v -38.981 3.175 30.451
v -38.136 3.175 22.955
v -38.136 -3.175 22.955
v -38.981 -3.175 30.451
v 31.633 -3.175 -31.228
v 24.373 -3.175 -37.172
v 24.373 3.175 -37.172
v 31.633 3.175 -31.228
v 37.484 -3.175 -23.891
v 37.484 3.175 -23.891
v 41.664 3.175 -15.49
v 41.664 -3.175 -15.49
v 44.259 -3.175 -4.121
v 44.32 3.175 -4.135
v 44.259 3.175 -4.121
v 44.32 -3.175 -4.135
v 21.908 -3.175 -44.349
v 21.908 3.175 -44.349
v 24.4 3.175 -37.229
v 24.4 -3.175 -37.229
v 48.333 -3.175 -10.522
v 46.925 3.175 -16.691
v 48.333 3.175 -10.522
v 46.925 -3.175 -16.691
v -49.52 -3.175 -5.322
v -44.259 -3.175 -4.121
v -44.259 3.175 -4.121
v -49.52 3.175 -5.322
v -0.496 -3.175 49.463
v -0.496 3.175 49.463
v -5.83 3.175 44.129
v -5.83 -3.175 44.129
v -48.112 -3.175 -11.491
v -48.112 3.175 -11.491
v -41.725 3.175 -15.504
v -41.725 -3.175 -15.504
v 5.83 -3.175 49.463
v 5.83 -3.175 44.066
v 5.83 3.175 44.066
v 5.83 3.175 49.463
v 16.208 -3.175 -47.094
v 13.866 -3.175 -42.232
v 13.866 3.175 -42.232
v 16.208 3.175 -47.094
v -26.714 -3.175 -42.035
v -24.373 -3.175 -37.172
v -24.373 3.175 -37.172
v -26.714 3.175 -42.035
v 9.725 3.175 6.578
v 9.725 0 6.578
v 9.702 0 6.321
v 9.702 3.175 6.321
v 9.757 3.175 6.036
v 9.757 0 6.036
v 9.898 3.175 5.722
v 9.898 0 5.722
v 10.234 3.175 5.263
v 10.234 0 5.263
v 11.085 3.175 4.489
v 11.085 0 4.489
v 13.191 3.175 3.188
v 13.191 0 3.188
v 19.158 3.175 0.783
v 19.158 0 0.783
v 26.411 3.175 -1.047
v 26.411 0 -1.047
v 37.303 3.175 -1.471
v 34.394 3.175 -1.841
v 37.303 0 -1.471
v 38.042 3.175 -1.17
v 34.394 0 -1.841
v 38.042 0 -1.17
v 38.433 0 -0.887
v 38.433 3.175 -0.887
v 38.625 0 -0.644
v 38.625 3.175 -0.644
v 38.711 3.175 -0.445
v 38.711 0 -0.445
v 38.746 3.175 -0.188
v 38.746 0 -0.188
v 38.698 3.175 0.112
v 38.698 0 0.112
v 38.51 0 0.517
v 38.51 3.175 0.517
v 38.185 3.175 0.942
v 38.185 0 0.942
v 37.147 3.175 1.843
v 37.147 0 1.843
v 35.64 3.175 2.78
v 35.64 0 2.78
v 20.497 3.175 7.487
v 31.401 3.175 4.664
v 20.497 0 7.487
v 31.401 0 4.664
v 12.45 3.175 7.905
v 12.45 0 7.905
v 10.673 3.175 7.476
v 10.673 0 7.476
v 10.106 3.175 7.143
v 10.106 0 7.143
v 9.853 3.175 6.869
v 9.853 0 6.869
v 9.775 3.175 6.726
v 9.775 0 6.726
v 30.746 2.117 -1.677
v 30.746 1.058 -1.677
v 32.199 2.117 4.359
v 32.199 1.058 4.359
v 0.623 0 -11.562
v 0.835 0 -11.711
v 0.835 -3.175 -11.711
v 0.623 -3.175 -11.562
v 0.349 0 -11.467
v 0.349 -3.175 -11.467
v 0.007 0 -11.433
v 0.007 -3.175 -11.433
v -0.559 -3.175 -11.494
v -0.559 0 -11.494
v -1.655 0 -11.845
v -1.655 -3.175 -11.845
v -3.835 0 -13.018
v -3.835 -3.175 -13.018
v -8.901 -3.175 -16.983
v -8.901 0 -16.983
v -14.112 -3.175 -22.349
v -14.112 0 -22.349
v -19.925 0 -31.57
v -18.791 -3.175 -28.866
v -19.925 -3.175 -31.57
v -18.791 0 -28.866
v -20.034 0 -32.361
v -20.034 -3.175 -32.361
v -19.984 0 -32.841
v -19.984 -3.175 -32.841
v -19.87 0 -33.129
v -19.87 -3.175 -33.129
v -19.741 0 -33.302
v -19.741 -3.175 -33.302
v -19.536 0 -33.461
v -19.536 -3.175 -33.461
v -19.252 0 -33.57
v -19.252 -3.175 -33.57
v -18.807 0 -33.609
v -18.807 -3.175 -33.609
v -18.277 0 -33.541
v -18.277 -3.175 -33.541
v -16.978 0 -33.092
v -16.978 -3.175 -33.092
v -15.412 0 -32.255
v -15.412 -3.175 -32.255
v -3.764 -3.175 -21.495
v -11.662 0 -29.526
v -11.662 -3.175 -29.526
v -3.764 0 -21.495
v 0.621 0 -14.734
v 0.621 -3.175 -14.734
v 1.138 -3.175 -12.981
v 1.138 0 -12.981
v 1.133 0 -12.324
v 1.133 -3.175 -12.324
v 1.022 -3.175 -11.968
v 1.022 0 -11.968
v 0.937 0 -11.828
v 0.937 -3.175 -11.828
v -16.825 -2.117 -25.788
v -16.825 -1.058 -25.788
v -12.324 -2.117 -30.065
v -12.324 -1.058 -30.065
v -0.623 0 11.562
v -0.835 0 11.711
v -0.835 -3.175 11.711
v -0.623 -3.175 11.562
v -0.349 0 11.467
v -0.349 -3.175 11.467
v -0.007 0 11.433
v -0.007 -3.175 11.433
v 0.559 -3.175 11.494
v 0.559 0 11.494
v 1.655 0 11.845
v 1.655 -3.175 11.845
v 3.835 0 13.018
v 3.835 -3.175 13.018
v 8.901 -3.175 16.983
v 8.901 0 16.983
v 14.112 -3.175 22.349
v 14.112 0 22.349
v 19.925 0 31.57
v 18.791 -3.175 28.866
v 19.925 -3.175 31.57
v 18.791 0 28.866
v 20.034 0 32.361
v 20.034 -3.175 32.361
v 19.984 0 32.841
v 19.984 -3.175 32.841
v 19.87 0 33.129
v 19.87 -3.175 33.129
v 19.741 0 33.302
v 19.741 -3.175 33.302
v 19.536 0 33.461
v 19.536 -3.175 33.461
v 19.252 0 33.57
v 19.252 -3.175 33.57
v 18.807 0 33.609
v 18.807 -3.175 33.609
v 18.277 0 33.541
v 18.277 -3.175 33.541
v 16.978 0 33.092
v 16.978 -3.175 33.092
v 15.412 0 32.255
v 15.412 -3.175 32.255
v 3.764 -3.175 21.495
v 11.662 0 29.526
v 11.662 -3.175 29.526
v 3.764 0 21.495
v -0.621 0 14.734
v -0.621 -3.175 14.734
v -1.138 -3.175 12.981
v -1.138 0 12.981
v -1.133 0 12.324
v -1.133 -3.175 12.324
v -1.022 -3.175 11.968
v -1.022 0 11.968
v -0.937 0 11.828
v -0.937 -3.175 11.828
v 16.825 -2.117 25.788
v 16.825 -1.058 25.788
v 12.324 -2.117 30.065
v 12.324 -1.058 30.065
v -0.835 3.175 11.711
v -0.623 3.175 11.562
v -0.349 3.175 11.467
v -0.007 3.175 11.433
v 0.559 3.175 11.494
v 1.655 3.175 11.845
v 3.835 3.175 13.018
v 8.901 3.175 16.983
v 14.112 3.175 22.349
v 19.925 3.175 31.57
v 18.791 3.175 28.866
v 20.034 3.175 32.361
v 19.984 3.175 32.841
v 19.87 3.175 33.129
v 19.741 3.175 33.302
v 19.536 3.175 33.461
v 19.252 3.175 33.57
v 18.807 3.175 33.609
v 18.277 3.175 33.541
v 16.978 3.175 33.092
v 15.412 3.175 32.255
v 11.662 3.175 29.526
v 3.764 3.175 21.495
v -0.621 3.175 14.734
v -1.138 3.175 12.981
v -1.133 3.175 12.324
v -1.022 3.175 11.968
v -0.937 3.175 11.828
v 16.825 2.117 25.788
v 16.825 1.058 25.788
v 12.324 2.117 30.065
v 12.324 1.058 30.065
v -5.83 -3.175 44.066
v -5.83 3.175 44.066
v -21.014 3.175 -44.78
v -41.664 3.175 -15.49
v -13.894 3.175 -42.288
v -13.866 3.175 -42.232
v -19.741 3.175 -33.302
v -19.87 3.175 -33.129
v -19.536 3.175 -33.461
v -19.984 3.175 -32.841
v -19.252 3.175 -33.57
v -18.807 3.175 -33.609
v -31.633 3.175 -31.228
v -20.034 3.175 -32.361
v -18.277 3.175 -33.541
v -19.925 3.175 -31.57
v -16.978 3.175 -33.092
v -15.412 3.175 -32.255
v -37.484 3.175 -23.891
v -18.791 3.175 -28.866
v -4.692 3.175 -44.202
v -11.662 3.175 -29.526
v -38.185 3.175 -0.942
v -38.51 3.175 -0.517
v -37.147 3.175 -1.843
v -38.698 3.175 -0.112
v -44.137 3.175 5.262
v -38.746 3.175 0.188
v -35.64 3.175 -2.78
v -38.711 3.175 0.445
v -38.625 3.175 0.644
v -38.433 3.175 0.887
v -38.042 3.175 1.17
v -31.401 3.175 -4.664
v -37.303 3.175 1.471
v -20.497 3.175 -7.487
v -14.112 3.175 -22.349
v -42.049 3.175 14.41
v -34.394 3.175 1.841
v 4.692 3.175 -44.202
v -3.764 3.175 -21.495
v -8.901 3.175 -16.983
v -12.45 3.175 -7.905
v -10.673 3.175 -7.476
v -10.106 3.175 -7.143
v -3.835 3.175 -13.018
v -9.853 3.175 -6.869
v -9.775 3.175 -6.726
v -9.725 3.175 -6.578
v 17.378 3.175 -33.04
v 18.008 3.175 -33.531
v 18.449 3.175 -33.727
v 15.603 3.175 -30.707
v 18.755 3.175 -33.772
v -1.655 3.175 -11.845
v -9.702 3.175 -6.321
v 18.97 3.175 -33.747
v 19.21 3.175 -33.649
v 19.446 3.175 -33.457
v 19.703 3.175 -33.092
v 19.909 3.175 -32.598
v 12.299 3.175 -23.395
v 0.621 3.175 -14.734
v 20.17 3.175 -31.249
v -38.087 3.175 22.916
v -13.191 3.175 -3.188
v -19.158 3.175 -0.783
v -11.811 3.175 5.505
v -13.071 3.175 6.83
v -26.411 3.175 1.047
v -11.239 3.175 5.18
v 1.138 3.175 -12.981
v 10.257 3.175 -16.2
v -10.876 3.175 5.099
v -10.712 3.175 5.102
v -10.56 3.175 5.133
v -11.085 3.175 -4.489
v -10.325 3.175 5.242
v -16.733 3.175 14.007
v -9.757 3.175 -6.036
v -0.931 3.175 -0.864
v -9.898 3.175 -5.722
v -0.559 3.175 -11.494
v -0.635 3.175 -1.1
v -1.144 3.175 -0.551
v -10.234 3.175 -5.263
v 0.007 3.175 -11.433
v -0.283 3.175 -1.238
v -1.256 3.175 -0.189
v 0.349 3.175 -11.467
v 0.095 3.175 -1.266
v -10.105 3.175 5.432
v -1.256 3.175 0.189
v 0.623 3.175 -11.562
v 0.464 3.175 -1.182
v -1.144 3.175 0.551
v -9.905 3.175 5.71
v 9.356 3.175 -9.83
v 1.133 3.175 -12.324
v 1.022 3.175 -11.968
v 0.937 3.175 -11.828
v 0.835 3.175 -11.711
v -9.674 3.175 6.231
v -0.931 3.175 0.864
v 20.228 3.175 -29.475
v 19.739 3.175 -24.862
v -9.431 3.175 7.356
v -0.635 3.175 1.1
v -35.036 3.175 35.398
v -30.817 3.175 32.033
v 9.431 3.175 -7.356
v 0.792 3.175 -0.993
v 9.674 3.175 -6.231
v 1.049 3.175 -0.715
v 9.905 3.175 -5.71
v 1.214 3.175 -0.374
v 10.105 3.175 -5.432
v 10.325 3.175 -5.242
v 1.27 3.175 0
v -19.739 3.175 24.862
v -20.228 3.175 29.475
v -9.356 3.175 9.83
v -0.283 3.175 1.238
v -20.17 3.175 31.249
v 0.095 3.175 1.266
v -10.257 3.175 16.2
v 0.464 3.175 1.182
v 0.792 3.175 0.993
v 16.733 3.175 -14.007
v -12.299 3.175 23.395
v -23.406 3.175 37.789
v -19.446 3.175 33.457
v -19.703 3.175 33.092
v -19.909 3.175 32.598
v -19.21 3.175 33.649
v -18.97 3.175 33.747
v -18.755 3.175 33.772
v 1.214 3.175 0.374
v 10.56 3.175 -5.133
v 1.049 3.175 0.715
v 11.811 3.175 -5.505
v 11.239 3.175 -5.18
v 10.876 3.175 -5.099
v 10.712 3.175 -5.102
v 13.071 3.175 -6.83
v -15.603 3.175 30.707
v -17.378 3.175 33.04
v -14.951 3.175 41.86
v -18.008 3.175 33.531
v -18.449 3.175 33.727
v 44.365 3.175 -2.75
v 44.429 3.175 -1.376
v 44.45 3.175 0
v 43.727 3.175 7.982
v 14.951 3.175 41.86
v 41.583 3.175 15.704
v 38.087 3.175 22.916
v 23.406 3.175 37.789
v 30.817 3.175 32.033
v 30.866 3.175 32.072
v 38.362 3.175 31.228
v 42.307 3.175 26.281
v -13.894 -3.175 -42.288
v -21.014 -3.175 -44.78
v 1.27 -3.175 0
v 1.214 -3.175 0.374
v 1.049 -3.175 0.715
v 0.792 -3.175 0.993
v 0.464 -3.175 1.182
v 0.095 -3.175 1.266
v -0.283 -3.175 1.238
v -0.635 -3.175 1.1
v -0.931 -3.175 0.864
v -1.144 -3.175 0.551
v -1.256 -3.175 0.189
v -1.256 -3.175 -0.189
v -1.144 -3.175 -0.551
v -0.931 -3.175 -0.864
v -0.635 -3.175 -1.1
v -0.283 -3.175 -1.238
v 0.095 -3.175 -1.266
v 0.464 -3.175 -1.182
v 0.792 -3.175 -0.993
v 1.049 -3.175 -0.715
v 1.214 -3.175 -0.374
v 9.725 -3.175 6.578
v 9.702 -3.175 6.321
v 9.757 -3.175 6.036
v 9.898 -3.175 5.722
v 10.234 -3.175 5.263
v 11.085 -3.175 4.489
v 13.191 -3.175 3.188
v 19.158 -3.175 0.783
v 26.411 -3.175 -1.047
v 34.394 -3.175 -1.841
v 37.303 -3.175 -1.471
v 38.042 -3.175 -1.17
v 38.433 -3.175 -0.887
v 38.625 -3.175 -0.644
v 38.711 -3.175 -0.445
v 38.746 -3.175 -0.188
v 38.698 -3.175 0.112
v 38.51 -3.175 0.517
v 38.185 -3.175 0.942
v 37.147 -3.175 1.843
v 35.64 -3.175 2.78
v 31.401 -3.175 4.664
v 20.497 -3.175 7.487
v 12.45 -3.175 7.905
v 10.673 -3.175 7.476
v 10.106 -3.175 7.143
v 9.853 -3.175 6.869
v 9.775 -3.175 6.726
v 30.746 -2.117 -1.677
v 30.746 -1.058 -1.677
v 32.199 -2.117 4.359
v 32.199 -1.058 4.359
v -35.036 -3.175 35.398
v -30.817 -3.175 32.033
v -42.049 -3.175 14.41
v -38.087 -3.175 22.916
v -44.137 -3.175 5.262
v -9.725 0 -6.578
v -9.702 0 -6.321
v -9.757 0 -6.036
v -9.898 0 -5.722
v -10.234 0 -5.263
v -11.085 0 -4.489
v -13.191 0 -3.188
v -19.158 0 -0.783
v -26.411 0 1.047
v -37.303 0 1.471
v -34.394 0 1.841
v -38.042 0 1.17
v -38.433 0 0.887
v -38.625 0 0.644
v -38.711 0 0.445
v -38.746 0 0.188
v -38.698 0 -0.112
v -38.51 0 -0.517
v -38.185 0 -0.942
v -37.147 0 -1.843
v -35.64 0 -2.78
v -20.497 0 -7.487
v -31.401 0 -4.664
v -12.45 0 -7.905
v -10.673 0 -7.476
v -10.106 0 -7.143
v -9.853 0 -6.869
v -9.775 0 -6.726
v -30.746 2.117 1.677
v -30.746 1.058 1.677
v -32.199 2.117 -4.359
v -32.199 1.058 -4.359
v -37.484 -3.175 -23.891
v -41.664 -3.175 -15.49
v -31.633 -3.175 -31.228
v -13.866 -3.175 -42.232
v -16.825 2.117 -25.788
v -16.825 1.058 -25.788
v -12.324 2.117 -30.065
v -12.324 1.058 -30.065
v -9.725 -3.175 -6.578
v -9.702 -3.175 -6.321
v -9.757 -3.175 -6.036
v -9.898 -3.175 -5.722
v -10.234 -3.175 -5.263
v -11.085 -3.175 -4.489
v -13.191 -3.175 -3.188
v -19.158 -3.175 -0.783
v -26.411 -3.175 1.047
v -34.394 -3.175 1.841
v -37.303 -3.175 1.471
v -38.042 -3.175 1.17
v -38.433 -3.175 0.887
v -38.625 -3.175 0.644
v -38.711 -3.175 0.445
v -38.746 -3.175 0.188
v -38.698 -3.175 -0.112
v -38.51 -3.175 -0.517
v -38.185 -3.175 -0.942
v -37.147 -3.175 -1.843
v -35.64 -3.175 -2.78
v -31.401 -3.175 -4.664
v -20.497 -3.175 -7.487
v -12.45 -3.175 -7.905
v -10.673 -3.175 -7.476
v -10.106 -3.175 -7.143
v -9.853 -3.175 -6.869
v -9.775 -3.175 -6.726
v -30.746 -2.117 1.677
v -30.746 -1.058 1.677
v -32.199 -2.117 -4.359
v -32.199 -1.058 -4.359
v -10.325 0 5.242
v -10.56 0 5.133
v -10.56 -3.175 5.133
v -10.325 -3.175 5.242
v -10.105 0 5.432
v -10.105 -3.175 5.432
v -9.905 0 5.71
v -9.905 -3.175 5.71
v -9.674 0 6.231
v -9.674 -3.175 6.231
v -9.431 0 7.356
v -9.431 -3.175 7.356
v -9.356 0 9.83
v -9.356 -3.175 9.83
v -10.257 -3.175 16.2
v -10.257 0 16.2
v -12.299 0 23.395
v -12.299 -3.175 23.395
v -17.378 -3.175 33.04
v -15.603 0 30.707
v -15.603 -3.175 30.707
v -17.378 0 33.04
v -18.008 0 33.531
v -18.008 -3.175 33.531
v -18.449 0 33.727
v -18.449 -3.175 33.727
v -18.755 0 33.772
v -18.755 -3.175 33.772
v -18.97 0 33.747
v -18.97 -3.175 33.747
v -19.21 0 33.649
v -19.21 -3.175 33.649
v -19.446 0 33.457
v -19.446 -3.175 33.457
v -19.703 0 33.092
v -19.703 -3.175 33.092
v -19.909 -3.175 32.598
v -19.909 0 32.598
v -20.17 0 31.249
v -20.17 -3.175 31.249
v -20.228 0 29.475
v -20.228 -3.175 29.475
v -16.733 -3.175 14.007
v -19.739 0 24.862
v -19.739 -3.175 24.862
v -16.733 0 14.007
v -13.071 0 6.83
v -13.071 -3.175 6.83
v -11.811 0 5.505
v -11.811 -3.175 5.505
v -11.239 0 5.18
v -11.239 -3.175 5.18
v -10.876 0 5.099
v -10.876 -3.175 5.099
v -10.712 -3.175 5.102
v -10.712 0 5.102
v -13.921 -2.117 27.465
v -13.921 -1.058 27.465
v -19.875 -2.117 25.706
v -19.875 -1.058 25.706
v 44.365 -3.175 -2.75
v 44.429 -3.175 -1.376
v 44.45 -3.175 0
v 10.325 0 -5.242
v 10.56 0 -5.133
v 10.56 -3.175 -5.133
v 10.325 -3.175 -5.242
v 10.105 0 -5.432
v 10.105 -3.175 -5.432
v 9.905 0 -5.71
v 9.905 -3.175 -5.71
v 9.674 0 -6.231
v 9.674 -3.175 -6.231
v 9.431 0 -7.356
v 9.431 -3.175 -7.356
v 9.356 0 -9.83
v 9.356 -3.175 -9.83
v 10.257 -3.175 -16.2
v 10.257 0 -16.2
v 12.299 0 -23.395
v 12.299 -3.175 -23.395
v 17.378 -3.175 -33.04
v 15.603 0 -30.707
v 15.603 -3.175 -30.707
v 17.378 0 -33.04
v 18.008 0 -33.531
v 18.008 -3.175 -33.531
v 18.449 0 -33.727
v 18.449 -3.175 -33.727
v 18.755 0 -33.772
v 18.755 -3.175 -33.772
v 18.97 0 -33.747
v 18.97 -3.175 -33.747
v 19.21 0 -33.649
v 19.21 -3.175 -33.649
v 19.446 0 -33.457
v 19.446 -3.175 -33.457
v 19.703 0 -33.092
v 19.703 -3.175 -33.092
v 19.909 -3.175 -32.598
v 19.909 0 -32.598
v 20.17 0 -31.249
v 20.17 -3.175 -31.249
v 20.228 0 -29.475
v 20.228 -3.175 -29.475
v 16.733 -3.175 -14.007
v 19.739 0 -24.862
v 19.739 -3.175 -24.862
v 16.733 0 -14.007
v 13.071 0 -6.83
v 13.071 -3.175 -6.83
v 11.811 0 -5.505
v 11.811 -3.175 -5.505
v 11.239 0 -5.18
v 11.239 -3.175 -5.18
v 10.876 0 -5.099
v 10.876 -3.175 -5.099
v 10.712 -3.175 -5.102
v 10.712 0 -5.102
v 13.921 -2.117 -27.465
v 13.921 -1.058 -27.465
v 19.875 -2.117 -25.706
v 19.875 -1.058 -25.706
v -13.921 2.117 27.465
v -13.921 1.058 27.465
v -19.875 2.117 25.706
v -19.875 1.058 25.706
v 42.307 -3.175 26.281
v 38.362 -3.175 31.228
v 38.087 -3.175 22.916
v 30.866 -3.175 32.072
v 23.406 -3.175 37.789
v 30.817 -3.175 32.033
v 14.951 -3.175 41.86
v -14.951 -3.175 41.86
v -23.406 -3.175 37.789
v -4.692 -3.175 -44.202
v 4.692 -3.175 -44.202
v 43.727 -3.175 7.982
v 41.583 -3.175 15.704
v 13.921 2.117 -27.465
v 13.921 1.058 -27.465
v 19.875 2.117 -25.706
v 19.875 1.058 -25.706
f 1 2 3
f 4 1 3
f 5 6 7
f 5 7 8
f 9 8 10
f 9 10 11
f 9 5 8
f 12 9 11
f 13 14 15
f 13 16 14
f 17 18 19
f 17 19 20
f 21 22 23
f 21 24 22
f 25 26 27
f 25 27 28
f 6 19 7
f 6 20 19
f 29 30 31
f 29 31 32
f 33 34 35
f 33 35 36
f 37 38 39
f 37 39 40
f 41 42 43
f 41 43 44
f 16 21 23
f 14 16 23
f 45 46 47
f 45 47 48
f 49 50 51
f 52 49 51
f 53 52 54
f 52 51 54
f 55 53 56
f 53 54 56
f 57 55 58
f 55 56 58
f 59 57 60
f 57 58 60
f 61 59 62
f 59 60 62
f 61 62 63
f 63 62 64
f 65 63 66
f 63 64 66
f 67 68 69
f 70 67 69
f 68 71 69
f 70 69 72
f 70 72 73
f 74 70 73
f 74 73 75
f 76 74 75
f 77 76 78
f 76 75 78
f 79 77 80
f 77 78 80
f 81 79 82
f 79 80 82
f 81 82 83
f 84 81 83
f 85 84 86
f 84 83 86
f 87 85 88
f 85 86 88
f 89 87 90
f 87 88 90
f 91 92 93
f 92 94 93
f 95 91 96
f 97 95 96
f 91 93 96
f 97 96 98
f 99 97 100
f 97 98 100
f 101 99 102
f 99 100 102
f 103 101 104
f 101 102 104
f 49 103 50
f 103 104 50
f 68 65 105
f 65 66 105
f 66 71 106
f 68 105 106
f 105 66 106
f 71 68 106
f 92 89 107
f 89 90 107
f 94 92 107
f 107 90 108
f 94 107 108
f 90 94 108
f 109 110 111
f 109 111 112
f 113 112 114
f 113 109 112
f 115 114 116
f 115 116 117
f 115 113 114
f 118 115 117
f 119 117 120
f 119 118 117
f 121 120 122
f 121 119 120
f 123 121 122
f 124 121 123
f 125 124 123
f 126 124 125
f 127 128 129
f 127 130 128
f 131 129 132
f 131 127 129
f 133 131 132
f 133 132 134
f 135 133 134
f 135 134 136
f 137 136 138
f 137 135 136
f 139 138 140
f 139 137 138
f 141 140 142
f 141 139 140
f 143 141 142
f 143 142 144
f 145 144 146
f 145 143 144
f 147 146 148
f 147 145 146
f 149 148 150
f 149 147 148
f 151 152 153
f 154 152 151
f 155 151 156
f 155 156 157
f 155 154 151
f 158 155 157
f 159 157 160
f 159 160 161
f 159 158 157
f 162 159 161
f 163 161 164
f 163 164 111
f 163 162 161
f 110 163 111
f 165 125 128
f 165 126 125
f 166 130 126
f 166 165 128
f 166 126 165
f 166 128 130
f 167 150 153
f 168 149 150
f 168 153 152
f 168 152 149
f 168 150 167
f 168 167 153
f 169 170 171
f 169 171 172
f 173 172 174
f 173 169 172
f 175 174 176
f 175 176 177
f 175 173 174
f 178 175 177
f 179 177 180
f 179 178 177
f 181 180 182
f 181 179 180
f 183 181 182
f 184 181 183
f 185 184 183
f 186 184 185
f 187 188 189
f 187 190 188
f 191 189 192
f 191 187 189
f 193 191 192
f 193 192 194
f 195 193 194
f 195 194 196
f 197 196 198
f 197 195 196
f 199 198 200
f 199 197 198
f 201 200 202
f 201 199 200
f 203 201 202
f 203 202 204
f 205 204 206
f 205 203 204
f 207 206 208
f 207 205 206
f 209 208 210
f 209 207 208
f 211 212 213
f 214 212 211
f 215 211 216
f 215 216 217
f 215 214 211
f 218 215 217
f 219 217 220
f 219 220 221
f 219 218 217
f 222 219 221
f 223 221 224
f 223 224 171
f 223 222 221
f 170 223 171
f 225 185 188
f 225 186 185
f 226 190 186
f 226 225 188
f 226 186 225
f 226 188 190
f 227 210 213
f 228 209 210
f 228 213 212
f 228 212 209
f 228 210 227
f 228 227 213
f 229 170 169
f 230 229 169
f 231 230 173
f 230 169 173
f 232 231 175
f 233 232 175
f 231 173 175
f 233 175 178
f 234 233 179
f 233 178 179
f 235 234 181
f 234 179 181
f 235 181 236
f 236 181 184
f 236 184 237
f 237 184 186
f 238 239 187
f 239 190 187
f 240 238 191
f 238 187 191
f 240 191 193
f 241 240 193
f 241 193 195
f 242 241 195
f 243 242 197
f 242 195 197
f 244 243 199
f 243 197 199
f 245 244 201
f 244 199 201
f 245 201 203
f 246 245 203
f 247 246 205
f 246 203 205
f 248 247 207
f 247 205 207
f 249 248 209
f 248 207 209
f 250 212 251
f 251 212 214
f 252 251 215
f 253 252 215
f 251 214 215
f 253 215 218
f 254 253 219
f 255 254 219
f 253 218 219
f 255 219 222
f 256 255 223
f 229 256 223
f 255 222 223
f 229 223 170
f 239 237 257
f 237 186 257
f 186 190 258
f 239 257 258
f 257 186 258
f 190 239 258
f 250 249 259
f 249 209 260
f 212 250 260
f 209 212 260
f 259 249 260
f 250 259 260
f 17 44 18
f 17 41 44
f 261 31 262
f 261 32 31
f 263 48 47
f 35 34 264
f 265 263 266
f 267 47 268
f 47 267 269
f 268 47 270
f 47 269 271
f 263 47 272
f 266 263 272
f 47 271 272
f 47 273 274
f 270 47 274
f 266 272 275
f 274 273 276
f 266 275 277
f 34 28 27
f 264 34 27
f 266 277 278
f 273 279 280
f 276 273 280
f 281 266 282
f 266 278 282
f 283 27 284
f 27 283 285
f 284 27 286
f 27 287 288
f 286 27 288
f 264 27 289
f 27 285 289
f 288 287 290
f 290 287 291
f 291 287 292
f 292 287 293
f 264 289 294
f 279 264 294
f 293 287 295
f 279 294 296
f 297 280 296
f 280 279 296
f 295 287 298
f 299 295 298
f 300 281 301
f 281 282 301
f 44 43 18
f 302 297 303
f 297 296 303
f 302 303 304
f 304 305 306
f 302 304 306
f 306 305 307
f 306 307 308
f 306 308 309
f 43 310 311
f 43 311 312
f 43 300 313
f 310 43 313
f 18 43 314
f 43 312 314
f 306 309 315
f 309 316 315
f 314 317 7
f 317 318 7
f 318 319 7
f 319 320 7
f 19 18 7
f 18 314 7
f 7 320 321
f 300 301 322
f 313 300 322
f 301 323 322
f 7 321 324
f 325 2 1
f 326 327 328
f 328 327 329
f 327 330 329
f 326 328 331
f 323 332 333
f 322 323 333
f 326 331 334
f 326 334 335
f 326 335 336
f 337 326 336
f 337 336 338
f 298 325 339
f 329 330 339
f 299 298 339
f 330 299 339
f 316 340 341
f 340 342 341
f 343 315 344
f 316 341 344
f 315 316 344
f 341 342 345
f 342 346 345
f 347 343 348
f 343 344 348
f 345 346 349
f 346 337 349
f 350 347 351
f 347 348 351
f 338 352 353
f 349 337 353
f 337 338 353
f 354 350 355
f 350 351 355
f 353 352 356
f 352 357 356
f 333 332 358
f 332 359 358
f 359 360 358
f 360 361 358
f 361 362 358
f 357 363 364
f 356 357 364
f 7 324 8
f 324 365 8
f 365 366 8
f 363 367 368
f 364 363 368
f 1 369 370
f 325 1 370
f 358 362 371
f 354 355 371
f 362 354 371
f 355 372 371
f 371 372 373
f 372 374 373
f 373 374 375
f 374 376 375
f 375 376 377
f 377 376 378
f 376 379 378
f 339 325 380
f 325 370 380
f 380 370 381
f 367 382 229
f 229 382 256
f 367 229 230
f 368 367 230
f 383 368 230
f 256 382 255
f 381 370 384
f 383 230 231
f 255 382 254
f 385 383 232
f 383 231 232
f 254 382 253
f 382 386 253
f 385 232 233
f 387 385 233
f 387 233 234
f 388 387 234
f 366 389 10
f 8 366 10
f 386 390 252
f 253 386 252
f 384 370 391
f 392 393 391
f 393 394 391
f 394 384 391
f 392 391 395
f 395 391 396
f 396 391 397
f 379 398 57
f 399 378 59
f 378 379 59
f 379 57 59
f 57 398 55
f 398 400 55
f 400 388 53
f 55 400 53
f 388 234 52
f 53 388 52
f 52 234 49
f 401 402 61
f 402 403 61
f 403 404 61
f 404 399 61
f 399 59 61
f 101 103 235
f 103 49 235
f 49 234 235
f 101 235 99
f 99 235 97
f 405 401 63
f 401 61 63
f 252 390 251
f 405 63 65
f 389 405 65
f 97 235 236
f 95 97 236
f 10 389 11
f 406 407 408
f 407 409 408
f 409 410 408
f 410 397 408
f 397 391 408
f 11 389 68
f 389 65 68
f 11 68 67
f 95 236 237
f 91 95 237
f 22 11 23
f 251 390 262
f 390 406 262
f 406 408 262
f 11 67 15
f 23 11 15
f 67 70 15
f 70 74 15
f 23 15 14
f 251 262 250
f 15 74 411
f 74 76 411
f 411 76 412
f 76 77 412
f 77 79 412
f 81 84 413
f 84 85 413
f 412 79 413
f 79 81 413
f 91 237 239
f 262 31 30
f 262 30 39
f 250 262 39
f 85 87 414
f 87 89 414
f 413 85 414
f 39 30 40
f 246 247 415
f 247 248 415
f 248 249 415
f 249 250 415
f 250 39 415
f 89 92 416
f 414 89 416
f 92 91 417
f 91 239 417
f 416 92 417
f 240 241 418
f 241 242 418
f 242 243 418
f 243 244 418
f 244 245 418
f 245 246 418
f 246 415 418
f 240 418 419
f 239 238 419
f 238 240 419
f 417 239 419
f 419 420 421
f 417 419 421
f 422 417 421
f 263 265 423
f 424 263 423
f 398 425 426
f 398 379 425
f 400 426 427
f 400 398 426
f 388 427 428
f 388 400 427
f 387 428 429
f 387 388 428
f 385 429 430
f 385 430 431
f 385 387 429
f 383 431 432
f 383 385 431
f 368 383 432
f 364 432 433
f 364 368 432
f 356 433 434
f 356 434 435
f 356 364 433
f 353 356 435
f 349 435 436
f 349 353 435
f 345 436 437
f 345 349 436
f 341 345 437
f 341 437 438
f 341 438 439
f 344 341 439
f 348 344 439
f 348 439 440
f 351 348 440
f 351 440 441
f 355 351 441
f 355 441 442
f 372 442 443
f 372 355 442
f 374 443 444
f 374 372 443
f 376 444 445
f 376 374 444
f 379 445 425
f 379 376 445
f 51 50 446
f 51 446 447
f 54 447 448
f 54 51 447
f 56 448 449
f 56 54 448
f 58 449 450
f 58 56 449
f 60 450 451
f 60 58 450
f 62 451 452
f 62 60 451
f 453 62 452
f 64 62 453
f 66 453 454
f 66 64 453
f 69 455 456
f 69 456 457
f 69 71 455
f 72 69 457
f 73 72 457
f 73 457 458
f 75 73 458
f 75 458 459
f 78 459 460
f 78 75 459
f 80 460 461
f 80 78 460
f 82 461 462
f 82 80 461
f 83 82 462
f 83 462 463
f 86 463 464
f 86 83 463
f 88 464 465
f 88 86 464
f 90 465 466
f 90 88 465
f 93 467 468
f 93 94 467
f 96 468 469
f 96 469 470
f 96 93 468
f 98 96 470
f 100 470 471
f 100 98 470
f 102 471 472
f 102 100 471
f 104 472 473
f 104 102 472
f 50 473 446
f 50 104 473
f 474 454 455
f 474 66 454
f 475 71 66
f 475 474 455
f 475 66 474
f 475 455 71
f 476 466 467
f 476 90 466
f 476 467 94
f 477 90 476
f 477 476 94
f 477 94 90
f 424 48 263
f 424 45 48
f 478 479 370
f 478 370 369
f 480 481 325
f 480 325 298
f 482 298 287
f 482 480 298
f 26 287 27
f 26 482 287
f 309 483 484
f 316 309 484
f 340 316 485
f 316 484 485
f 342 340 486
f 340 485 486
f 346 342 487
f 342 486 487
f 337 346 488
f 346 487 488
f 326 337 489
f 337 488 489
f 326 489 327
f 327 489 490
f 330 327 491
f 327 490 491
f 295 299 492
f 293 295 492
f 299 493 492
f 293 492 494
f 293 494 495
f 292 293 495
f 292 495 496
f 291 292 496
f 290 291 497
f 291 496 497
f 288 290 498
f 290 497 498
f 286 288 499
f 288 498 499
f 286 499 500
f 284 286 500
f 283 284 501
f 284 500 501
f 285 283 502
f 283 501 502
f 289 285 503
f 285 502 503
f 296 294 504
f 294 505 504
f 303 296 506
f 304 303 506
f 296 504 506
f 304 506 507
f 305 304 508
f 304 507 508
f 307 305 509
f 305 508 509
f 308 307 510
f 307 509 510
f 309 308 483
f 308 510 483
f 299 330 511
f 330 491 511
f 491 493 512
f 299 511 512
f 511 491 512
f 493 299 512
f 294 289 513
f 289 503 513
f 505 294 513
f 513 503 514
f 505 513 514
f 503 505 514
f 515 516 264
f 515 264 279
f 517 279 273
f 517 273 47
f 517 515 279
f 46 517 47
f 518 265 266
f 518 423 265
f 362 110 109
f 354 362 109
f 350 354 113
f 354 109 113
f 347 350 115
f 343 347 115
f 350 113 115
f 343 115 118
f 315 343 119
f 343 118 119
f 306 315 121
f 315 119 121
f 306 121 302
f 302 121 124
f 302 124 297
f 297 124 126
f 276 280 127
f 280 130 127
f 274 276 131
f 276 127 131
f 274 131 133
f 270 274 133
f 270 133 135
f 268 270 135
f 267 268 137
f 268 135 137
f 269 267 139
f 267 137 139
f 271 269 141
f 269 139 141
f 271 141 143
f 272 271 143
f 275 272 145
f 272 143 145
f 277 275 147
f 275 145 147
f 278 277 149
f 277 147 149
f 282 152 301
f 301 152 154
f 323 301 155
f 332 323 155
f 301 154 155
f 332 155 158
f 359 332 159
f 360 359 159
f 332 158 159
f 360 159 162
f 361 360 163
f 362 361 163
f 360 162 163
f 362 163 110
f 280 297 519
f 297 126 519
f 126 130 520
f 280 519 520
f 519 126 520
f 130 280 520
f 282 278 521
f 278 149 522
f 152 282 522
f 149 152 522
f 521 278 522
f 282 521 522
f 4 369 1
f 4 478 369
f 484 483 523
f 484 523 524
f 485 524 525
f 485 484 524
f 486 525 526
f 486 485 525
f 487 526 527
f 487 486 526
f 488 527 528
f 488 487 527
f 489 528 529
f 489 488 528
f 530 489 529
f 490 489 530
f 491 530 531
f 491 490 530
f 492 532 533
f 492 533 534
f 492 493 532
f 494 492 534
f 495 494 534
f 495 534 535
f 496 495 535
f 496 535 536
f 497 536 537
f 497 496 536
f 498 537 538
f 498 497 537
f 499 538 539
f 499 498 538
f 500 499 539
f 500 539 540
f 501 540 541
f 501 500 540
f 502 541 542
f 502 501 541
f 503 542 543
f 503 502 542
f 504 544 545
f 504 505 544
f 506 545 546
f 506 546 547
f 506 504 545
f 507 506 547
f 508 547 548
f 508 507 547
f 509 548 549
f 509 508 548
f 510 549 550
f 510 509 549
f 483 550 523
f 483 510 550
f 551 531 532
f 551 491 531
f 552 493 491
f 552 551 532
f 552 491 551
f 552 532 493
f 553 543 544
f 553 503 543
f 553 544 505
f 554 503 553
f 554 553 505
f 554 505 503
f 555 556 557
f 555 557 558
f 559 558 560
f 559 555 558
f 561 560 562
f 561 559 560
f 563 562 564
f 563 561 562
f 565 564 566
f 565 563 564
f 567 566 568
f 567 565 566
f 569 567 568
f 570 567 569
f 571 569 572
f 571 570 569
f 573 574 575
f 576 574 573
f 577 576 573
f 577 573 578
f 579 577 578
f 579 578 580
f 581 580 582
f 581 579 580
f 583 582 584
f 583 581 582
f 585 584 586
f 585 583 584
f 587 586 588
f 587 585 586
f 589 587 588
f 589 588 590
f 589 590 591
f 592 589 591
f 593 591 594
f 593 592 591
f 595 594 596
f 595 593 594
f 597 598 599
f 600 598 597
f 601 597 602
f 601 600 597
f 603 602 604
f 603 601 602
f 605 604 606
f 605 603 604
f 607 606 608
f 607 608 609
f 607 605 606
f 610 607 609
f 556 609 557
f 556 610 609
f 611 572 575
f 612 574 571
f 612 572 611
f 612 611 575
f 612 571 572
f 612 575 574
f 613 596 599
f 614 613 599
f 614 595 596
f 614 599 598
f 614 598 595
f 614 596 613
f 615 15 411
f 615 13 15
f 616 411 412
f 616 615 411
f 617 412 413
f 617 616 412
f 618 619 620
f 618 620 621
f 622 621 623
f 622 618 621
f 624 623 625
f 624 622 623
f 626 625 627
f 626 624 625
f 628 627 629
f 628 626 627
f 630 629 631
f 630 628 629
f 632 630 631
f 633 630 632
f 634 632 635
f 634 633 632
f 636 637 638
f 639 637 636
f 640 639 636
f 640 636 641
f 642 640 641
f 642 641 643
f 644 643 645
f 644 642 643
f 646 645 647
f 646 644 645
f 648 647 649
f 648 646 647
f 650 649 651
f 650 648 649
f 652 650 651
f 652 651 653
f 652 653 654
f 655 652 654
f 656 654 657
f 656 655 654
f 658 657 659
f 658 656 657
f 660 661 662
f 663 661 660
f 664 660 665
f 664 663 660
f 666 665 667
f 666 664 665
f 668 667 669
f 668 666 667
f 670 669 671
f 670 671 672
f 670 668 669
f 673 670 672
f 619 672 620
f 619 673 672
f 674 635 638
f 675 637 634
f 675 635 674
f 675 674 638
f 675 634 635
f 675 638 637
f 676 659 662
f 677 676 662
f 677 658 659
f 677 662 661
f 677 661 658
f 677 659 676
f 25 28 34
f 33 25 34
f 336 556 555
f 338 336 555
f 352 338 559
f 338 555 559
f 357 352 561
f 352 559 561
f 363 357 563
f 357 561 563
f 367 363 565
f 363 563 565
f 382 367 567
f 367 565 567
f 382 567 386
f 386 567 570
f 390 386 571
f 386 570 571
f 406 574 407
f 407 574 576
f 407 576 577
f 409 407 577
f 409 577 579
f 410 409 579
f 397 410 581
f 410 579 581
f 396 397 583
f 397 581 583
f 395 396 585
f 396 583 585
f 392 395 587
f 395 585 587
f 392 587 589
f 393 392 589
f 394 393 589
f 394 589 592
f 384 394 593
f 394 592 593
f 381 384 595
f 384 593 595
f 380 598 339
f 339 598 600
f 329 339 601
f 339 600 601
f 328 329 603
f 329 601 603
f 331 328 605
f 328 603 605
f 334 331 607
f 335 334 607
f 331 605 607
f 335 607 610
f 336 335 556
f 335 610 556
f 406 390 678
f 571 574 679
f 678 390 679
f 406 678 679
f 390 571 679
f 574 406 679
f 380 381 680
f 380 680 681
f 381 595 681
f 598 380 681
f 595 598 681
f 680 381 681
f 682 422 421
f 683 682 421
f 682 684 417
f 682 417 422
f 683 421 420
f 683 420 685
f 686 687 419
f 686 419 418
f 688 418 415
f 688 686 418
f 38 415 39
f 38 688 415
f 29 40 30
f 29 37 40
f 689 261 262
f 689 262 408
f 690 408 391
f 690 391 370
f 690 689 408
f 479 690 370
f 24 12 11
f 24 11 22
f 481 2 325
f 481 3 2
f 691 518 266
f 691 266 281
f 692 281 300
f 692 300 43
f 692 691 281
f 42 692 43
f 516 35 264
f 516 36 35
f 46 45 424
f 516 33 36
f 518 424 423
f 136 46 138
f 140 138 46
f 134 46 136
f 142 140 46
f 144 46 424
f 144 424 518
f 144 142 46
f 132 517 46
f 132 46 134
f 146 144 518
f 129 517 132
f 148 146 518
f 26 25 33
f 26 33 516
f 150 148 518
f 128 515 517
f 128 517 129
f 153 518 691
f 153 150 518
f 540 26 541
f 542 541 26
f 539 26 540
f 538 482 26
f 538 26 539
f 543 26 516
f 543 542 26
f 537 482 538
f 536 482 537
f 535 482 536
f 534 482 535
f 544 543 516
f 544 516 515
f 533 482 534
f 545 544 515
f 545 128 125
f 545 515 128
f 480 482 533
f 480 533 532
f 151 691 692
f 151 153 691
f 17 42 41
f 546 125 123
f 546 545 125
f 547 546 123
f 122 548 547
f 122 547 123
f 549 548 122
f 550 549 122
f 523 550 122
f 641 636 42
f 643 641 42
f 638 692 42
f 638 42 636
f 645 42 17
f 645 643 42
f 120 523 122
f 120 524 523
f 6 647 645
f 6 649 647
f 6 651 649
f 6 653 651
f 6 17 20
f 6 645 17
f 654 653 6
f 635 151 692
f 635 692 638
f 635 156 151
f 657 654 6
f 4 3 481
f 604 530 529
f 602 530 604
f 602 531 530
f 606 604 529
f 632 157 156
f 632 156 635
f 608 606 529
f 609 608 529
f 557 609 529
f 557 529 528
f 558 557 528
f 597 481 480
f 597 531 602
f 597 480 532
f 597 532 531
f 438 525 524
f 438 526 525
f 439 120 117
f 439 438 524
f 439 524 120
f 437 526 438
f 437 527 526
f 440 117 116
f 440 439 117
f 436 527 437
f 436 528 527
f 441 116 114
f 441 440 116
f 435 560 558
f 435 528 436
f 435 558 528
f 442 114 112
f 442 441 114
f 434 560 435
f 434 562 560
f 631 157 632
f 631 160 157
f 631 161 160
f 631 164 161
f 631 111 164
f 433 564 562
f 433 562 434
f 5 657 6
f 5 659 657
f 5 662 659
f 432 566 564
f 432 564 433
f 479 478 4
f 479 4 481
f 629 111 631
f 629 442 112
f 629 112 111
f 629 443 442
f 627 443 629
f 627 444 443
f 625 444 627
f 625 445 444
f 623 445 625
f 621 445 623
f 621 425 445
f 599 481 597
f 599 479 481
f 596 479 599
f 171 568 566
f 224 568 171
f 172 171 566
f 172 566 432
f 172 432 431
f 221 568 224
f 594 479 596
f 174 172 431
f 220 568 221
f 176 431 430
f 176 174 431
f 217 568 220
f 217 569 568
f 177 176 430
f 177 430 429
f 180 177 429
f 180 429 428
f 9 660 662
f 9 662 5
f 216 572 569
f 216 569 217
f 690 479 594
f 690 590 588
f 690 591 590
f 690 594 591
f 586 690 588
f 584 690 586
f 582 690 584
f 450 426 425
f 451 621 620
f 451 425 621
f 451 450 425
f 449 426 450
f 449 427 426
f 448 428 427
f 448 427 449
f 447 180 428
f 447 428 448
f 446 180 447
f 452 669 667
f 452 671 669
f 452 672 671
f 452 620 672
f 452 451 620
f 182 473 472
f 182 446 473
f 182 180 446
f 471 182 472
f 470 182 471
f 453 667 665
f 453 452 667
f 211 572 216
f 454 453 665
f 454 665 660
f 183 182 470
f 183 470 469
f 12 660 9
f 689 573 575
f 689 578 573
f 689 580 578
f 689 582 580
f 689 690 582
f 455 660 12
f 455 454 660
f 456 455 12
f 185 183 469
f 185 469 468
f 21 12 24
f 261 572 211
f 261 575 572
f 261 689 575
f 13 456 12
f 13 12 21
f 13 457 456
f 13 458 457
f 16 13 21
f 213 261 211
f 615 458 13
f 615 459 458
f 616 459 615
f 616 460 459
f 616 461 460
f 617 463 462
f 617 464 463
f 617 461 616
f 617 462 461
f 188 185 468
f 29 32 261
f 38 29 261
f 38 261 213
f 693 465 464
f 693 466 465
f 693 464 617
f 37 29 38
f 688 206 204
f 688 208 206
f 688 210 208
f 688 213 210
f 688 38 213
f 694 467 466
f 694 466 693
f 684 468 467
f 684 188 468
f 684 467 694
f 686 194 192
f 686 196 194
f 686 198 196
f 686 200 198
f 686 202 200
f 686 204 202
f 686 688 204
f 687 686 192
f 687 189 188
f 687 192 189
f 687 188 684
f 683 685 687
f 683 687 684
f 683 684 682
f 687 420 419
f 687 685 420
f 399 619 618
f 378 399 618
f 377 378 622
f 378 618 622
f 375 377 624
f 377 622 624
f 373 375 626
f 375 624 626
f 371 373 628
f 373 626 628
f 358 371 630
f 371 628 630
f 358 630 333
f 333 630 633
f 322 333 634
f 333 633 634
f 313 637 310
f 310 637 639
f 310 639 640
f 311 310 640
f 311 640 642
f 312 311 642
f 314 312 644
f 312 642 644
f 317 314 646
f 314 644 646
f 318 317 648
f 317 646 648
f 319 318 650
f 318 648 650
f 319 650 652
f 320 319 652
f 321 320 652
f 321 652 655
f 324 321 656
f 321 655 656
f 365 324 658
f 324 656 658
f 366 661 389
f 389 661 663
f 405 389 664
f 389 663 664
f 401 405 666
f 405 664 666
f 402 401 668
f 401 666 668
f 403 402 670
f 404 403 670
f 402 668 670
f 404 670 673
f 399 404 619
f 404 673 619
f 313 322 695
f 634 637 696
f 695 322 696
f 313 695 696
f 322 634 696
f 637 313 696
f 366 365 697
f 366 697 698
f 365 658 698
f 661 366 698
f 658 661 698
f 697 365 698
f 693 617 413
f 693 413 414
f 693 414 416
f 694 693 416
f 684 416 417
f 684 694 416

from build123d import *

# Parameters (mm, degrees)
F0_R     = 1.27
F1_DEPTH = 3.175
F2_SIZE  = 5.334


with BuildPart() as f1:
    # F0 (on Front) → F1 (new body, symmetric)
    with BuildSketch(Plane.XZ):
        with BuildLine():
            ThreePointArc((44.258528, -4.121313), (44.402106, -2.062879), (44.45, 0))
            ThreePointArc((44.45, 0), (42.829819, 11.891557), (38.087385, 22.916231))
            ThreePointArc((38.087385, 22.916231), (34.752409, 27.714122), (30.816913, 32.033113))
            ThreePointArc((30.816913, 32.033113), (19.286132, 40.048066), (5.830465, 44.065953))
            ThreePointArc((5.830465, 44.065953), (0, 44.45), (-5.830465, 44.065953))
            ThreePointArc((-5.830465, 44.065953), (-19.286132, 40.048066), (-30.816913, 32.033113))
            ThreePointArc((-30.816913, 32.033113), (-34.752409, 27.714122), (-38.087385, 22.916231))
            ThreePointArc((-38.087385, 22.916231), (-43.335546, 9.891056), (-44.258528, -4.121313))
            ThreePointArc((-44.258528, -4.121313), (-43.335546, -9.891056), (-41.663726, -15.48988))
            ThreePointArc((-41.663726, -15.48988), (-34.752409, -27.714122), (-24.372568, -37.172307))
            ThreePointArc((-24.372568, -37.172307), (-19.286132, -40.048066), (-13.866432, -42.231796))
            ThreePointArc((-13.866432, -42.231796), (0, -44.45), (13.866432, -42.231796))
            ThreePointArc((13.866432, -42.231796), (19.286132, -40.048066), (24.372568, -37.172307))
            ThreePointArc((24.372568, -37.172307), (34.752409, -27.714122), (41.663726, -15.48988))
            ThreePointArc((41.663726, -15.48988), (43.335546, -9.891056), (44.258528, -4.121313))
        make_face()
        with BuildLine():
            add(Edge.make_bspline(
                [(0.834731, -11.71119), (-3.66602, -7.434163), (-16.824949, -25.788016), (-29.983878, -44.141868), (-12.324198, -30.065043), (5.335483, -15.988218), (0.834731, -11.71119)],
                knots=[0, 0, 0, 2.094395, 2.094395, 4.18879, 4.18879, 6.283185, 6.283185, 6.283185], degree=2, weights=[1, 0.5, 1, 0.5, 1, 0.5, 1]))
        make_face(mode=Mode.SUBTRACT)
        with BuildLine():
            add(Edge.make_bspline(
                [(-9.724823, -6.578494), (-8.271184, -0.542215), (-30.745551, 1.676825), (-53.219918, 3.895866), (-32.19919, -4.359453), (-11.178461, -12.614772), (-9.724823, -6.578494)],
                knots=[0, 0, 0, 2.094395, 2.094395, 4.18879, 4.18879, 6.283185, 6.283185, 6.283185], degree=2, weights=[1, 0.5, 1, 0.5, 1, 0.5, 1]))
        make_face(mode=Mode.SUBTRACT)
        with BuildLine():
            add(Edge.make_bspline(
                [(10.559554, -5.132697), (4.605164, -6.891948), (13.920602, -27.464841), (23.23604, -48.037734), (19.874992, -25.70559), (16.513944, -3.373445), (10.559554, -5.132697)],
                knots=[0, 0, 0, 2.094395, 2.094395, 4.18879, 4.18879, 6.283185, 6.283185, 6.283185], degree=2, weights=[1, 0.5, 1, 0.5, 1, 0.5, 1]))
        make_face(mode=Mode.SUBTRACT)
        Circle(F0_R, mode=Mode.SUBTRACT)
        with BuildLine():
            add(Edge.make_bspline(
                [(-10.559554, 5.132697), (-4.605164, 6.891948), (-13.920602, 27.464841), (-23.23604, 48.037734), (-19.874992, 25.70559), (-16.513944, 3.373445), (-10.559554, 5.132697)],
                knots=[0, 0, 0, 2.094395, 2.094395, 4.18879, 4.18879, 6.283185, 6.283185, 6.283185], degree=2, weights=[1, 0.5, 1, 0.5, 1, 0.5, 1]))
        make_face(mode=Mode.SUBTRACT)
        with BuildLine():
            add(Edge.make_bspline(
                [(9.724823, 6.578494), (8.271184, 0.542215), (30.745551, -1.676825), (53.219918, -3.895866), (32.19919, 4.359453), (11.178461, 12.614772), (9.724823, 6.578494)],
                knots=[0, 0, 0, 2.094395, 2.094395, 4.18879, 4.18879, 6.283185, 6.283185, 6.283185], degree=2, weights=[1, 0.5, 1, 0.5, 1, 0.5, 1]))
        make_face(mode=Mode.SUBTRACT)
        with BuildLine():
            add(Edge.make_bspline(
                [(-0.834731, 11.71119), (3.66602, 7.434163), (16.824949, 25.788016), (29.983878, 44.141868), (12.324198, 30.065043), (-5.335483, 15.988218), (-0.834731, 11.71119)],
                knots=[0, 0, 0, 2.094395, 2.094395, 4.18879, 4.18879, 6.283185, 6.283185, 6.283185], degree=2, weights=[1, 0.5, 1, 0.5, 1, 0.5, 1]))
        make_face(mode=Mode.SUBTRACT)
        with BuildLine():
            ThreePointArc((-38.087385, 22.916231), (-34.752409, 27.714122), (-30.816913, 32.033113))
            Line((-30.816913, 32.033113), (-35.036249, 35.397922))
            Line((-35.036249, 35.397922), (-42.306721, 26.281039))
            Line((-42.306721, 26.281039), (-38.087385, 22.916231))
        make_face()
        with BuildLine():
            ThreePointArc((-5.830465, 44.065953), (0, 44.45), (5.830465, 44.065953))
            Line((5.830465, 44.065953), (5.830465, 49.462686))
            Line((5.830465, 49.462686), (-5.830465, 49.462686))
            Line((-5.830465, 49.462686), (-5.830465, 44.065953))
        make_face()
        with BuildLine():
            ThreePointArc((30.816913, 32.033113), (34.752409, 27.714122), (38.087385, 22.916231))
            Line((38.087385, 22.916231), (42.306721, 26.281039))
            Line((42.306721, 26.281039), (35.036249, 35.397922))
            Line((35.036249, 35.397922), (30.816913, 32.033113))
        make_face()
        with BuildLine():
            Line((49.519954, -5.3222), (44.258528, -4.121313))
            ThreePointArc((44.258528, -4.121313), (43.335546, -9.891056), (41.663726, -15.48988))
            Line((41.663726, -15.48988), (46.925153, -16.690767))
            Line((46.925153, -16.690767), (49.519954, -5.3222))
        make_face()
        with BuildLine():
            Line((26.714123, -42.034596), (24.372568, -37.172307))
            ThreePointArc((24.372568, -37.172307), (19.286132, -40.048066), (13.866432, -42.231796))
            Line((13.866432, -42.231796), (16.207987, -47.094084))
            Line((16.207987, -47.094084), (26.714123, -42.034596))
        make_face()
        with BuildLine():
            Line((-16.207987, -47.094084), (-13.866432, -42.231796))
            ThreePointArc((-13.866432, -42.231796), (-19.286132, -40.048066), (-24.372568, -37.172307))
            Line((-24.372568, -37.172307), (-26.714123, -42.034596))
            Line((-26.714123, -42.034596), (-16.207987, -47.094084))
        make_face()
        with BuildLine():
            ThreePointArc((-41.663726, -15.48988), (-43.335546, -9.891056), (-44.258528, -4.121313))
            Line((-44.258528, -4.121313), (-49.519954, -5.3222))
            Line((-49.519954, -5.3222), (-46.925153, -16.690767))
            Line((-46.925153, -16.690767), (-41.663726, -15.48988))
        make_face()
    extrude(amount=F1_DEPTH, both=True)

    # F2
    f2_edges = [f1.edges().sort_by_distance(p)[0] for p in [
        (-42.306721, 0, 26.281039),
        (-46.925153, 0, -16.690767),
        (-5.830465, 0, 49.462686),
        (35.036249, 0, 35.397922),
        (49.519954, 0, -5.3222),
        (26.714123, 0, -42.034596),
        (-16.207987, 0, -47.094084),
    ]]
    chamfer(f2_edges, length=F2_SIZE)


solid = f1.part
